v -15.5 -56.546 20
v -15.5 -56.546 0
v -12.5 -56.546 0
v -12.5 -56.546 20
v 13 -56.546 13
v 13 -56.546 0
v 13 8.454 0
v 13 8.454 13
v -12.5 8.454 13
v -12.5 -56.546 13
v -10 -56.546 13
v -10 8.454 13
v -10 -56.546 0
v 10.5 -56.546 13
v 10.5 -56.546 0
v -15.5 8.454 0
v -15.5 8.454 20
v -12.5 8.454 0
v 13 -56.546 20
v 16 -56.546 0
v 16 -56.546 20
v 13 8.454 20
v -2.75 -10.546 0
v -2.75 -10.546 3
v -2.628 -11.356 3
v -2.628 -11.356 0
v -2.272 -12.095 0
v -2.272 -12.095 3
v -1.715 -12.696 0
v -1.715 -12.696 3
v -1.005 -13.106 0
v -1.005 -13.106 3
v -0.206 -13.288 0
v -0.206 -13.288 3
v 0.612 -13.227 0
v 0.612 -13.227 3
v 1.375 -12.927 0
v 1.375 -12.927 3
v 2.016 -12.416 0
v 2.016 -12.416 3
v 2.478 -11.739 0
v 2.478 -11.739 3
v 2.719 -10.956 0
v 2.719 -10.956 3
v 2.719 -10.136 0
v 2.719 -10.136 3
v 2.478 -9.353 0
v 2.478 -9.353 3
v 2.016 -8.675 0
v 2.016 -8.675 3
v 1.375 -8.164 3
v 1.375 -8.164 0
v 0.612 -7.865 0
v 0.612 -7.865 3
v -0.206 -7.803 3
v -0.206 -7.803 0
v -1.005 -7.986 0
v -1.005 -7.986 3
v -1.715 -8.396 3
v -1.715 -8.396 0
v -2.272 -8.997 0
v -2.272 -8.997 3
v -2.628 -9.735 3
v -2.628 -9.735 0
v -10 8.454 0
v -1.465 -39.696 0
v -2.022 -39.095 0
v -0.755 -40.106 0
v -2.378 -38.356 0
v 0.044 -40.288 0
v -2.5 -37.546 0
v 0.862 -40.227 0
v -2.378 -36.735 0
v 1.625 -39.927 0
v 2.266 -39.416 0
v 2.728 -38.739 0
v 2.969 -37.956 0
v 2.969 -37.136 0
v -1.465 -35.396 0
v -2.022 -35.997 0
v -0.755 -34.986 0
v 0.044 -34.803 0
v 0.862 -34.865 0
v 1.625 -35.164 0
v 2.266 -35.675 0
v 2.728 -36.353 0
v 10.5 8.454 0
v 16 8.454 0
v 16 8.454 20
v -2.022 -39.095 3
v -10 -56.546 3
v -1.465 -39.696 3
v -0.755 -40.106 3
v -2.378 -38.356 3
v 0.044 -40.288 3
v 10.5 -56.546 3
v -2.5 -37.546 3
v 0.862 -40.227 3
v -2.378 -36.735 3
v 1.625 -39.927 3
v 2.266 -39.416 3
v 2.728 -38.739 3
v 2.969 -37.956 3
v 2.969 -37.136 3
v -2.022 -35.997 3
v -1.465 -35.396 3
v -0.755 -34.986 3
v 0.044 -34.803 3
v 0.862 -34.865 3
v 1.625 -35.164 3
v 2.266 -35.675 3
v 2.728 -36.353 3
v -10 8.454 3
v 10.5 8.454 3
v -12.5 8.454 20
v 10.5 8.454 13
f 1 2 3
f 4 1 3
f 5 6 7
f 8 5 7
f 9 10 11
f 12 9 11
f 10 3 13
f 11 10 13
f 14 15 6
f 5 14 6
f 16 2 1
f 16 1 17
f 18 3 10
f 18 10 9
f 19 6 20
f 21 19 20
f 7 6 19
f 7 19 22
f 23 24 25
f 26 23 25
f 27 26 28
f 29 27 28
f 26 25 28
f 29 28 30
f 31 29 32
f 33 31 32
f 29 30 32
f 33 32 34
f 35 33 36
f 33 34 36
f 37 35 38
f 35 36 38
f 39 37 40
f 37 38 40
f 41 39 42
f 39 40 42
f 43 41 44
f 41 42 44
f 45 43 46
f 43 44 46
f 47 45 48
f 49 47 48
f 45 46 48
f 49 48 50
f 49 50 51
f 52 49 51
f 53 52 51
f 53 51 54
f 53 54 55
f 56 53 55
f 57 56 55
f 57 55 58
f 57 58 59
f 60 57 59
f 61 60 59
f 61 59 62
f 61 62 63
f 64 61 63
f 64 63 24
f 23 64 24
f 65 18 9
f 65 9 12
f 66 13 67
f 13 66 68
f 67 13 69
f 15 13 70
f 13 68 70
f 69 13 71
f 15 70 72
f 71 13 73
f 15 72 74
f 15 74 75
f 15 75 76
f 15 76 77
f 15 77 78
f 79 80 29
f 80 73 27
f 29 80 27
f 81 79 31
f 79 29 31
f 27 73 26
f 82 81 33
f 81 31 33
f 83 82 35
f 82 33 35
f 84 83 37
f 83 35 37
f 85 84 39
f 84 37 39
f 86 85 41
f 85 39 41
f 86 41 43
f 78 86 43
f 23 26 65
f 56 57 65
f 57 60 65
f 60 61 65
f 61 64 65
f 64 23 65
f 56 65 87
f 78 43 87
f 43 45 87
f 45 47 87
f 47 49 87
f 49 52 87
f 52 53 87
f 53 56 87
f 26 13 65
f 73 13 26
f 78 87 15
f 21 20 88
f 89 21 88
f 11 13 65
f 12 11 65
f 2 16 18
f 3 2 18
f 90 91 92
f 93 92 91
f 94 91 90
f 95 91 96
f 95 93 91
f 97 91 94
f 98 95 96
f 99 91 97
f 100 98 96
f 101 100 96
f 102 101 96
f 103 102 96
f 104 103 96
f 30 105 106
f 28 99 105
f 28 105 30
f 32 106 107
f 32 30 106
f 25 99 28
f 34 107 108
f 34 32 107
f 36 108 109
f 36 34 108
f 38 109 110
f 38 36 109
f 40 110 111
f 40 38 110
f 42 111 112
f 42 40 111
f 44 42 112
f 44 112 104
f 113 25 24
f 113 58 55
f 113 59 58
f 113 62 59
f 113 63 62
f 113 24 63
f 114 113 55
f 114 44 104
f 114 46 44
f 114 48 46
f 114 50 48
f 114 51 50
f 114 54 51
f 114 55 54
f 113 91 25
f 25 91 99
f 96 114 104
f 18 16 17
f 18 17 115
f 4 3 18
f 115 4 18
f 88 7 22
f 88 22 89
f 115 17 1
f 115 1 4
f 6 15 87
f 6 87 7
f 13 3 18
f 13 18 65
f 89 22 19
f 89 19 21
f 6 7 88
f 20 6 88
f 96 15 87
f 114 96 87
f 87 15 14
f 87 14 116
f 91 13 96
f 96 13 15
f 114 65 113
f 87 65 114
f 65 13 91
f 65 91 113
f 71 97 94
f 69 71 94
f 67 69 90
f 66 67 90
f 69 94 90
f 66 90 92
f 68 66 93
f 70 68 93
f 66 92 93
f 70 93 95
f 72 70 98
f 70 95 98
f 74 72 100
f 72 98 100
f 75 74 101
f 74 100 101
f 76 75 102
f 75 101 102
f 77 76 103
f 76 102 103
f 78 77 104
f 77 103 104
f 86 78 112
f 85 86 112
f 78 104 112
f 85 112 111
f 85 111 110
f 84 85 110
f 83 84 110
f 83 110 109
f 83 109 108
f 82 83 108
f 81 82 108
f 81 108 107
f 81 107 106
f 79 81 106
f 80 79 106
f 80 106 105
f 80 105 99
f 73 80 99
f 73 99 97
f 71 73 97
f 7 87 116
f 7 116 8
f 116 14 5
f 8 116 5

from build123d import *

# Parameters (mm, degrees)
F0_W     = 20.5
F0_H     = 65
F1_DEPTH = 3
F0_W_2   = 3
F2_DEPTH = 20
F3_D     = 5.5
F0_W_3   = 2.5
F4_DEPTH = 13


with BuildPart() as f1:
    # F0 (on Top) → F1 (new body)
    with BuildSketch(Plane.XY):
        with Locations((0.2499998137, -24.0457747273)):
            Rectangle(F0_W, F0_H)
    extrude(amount=F1_DEPTH)

    # F3 (through all)
    with Locations(Plane(origin=(0, 0, 0), x_dir=(1, 0, 0), z_dir=(0, 0, -1))):
        with Locations((0, 10.5457747273), (0.2499998137, 37.5457747273)):
            Hole(F3_D / 2)


with BuildPart() as f2:
    # F0 (on Top) → F2 (new body)
    with BuildSketch(Plane.XY):
        with Locations((14.4999998137, -24.0457747273)):
            Rectangle(F0_W_2, F0_H)
    extrude(amount=F2_DEPTH)


with BuildPart() as f2b:
    # F0 (on Top) → F2, piece 2 (new body)
    with BuildSketch(Plane.XY):
        with Locations((-14.0000001863, -24.0457747273)):
            Rectangle(F0_W_2, F0_H)
    extrude(amount=F2_DEPTH)


with BuildPart() as f4:
    # F0 (on Top) → F4 (new body)
    with BuildSketch(Plane.XY):
        with Locations((11.7499998137, -24.0457747273)):
            Rectangle(F0_W_3, F0_H)
    extrude(amount=F4_DEPTH)


with BuildPart() as f4b:
    # F0 (on Top) → F4, piece 2 (new body)
    with BuildSketch(Plane.XY):
        with Locations((-11.2500001863, -24.0457747273)):
            Rectangle(F0_W_3, F0_H)
    extrude(amount=F4_DEPTH)


solid = Compound([f1.part, f2.part, f2b.part, f4.part, f4b.part])
